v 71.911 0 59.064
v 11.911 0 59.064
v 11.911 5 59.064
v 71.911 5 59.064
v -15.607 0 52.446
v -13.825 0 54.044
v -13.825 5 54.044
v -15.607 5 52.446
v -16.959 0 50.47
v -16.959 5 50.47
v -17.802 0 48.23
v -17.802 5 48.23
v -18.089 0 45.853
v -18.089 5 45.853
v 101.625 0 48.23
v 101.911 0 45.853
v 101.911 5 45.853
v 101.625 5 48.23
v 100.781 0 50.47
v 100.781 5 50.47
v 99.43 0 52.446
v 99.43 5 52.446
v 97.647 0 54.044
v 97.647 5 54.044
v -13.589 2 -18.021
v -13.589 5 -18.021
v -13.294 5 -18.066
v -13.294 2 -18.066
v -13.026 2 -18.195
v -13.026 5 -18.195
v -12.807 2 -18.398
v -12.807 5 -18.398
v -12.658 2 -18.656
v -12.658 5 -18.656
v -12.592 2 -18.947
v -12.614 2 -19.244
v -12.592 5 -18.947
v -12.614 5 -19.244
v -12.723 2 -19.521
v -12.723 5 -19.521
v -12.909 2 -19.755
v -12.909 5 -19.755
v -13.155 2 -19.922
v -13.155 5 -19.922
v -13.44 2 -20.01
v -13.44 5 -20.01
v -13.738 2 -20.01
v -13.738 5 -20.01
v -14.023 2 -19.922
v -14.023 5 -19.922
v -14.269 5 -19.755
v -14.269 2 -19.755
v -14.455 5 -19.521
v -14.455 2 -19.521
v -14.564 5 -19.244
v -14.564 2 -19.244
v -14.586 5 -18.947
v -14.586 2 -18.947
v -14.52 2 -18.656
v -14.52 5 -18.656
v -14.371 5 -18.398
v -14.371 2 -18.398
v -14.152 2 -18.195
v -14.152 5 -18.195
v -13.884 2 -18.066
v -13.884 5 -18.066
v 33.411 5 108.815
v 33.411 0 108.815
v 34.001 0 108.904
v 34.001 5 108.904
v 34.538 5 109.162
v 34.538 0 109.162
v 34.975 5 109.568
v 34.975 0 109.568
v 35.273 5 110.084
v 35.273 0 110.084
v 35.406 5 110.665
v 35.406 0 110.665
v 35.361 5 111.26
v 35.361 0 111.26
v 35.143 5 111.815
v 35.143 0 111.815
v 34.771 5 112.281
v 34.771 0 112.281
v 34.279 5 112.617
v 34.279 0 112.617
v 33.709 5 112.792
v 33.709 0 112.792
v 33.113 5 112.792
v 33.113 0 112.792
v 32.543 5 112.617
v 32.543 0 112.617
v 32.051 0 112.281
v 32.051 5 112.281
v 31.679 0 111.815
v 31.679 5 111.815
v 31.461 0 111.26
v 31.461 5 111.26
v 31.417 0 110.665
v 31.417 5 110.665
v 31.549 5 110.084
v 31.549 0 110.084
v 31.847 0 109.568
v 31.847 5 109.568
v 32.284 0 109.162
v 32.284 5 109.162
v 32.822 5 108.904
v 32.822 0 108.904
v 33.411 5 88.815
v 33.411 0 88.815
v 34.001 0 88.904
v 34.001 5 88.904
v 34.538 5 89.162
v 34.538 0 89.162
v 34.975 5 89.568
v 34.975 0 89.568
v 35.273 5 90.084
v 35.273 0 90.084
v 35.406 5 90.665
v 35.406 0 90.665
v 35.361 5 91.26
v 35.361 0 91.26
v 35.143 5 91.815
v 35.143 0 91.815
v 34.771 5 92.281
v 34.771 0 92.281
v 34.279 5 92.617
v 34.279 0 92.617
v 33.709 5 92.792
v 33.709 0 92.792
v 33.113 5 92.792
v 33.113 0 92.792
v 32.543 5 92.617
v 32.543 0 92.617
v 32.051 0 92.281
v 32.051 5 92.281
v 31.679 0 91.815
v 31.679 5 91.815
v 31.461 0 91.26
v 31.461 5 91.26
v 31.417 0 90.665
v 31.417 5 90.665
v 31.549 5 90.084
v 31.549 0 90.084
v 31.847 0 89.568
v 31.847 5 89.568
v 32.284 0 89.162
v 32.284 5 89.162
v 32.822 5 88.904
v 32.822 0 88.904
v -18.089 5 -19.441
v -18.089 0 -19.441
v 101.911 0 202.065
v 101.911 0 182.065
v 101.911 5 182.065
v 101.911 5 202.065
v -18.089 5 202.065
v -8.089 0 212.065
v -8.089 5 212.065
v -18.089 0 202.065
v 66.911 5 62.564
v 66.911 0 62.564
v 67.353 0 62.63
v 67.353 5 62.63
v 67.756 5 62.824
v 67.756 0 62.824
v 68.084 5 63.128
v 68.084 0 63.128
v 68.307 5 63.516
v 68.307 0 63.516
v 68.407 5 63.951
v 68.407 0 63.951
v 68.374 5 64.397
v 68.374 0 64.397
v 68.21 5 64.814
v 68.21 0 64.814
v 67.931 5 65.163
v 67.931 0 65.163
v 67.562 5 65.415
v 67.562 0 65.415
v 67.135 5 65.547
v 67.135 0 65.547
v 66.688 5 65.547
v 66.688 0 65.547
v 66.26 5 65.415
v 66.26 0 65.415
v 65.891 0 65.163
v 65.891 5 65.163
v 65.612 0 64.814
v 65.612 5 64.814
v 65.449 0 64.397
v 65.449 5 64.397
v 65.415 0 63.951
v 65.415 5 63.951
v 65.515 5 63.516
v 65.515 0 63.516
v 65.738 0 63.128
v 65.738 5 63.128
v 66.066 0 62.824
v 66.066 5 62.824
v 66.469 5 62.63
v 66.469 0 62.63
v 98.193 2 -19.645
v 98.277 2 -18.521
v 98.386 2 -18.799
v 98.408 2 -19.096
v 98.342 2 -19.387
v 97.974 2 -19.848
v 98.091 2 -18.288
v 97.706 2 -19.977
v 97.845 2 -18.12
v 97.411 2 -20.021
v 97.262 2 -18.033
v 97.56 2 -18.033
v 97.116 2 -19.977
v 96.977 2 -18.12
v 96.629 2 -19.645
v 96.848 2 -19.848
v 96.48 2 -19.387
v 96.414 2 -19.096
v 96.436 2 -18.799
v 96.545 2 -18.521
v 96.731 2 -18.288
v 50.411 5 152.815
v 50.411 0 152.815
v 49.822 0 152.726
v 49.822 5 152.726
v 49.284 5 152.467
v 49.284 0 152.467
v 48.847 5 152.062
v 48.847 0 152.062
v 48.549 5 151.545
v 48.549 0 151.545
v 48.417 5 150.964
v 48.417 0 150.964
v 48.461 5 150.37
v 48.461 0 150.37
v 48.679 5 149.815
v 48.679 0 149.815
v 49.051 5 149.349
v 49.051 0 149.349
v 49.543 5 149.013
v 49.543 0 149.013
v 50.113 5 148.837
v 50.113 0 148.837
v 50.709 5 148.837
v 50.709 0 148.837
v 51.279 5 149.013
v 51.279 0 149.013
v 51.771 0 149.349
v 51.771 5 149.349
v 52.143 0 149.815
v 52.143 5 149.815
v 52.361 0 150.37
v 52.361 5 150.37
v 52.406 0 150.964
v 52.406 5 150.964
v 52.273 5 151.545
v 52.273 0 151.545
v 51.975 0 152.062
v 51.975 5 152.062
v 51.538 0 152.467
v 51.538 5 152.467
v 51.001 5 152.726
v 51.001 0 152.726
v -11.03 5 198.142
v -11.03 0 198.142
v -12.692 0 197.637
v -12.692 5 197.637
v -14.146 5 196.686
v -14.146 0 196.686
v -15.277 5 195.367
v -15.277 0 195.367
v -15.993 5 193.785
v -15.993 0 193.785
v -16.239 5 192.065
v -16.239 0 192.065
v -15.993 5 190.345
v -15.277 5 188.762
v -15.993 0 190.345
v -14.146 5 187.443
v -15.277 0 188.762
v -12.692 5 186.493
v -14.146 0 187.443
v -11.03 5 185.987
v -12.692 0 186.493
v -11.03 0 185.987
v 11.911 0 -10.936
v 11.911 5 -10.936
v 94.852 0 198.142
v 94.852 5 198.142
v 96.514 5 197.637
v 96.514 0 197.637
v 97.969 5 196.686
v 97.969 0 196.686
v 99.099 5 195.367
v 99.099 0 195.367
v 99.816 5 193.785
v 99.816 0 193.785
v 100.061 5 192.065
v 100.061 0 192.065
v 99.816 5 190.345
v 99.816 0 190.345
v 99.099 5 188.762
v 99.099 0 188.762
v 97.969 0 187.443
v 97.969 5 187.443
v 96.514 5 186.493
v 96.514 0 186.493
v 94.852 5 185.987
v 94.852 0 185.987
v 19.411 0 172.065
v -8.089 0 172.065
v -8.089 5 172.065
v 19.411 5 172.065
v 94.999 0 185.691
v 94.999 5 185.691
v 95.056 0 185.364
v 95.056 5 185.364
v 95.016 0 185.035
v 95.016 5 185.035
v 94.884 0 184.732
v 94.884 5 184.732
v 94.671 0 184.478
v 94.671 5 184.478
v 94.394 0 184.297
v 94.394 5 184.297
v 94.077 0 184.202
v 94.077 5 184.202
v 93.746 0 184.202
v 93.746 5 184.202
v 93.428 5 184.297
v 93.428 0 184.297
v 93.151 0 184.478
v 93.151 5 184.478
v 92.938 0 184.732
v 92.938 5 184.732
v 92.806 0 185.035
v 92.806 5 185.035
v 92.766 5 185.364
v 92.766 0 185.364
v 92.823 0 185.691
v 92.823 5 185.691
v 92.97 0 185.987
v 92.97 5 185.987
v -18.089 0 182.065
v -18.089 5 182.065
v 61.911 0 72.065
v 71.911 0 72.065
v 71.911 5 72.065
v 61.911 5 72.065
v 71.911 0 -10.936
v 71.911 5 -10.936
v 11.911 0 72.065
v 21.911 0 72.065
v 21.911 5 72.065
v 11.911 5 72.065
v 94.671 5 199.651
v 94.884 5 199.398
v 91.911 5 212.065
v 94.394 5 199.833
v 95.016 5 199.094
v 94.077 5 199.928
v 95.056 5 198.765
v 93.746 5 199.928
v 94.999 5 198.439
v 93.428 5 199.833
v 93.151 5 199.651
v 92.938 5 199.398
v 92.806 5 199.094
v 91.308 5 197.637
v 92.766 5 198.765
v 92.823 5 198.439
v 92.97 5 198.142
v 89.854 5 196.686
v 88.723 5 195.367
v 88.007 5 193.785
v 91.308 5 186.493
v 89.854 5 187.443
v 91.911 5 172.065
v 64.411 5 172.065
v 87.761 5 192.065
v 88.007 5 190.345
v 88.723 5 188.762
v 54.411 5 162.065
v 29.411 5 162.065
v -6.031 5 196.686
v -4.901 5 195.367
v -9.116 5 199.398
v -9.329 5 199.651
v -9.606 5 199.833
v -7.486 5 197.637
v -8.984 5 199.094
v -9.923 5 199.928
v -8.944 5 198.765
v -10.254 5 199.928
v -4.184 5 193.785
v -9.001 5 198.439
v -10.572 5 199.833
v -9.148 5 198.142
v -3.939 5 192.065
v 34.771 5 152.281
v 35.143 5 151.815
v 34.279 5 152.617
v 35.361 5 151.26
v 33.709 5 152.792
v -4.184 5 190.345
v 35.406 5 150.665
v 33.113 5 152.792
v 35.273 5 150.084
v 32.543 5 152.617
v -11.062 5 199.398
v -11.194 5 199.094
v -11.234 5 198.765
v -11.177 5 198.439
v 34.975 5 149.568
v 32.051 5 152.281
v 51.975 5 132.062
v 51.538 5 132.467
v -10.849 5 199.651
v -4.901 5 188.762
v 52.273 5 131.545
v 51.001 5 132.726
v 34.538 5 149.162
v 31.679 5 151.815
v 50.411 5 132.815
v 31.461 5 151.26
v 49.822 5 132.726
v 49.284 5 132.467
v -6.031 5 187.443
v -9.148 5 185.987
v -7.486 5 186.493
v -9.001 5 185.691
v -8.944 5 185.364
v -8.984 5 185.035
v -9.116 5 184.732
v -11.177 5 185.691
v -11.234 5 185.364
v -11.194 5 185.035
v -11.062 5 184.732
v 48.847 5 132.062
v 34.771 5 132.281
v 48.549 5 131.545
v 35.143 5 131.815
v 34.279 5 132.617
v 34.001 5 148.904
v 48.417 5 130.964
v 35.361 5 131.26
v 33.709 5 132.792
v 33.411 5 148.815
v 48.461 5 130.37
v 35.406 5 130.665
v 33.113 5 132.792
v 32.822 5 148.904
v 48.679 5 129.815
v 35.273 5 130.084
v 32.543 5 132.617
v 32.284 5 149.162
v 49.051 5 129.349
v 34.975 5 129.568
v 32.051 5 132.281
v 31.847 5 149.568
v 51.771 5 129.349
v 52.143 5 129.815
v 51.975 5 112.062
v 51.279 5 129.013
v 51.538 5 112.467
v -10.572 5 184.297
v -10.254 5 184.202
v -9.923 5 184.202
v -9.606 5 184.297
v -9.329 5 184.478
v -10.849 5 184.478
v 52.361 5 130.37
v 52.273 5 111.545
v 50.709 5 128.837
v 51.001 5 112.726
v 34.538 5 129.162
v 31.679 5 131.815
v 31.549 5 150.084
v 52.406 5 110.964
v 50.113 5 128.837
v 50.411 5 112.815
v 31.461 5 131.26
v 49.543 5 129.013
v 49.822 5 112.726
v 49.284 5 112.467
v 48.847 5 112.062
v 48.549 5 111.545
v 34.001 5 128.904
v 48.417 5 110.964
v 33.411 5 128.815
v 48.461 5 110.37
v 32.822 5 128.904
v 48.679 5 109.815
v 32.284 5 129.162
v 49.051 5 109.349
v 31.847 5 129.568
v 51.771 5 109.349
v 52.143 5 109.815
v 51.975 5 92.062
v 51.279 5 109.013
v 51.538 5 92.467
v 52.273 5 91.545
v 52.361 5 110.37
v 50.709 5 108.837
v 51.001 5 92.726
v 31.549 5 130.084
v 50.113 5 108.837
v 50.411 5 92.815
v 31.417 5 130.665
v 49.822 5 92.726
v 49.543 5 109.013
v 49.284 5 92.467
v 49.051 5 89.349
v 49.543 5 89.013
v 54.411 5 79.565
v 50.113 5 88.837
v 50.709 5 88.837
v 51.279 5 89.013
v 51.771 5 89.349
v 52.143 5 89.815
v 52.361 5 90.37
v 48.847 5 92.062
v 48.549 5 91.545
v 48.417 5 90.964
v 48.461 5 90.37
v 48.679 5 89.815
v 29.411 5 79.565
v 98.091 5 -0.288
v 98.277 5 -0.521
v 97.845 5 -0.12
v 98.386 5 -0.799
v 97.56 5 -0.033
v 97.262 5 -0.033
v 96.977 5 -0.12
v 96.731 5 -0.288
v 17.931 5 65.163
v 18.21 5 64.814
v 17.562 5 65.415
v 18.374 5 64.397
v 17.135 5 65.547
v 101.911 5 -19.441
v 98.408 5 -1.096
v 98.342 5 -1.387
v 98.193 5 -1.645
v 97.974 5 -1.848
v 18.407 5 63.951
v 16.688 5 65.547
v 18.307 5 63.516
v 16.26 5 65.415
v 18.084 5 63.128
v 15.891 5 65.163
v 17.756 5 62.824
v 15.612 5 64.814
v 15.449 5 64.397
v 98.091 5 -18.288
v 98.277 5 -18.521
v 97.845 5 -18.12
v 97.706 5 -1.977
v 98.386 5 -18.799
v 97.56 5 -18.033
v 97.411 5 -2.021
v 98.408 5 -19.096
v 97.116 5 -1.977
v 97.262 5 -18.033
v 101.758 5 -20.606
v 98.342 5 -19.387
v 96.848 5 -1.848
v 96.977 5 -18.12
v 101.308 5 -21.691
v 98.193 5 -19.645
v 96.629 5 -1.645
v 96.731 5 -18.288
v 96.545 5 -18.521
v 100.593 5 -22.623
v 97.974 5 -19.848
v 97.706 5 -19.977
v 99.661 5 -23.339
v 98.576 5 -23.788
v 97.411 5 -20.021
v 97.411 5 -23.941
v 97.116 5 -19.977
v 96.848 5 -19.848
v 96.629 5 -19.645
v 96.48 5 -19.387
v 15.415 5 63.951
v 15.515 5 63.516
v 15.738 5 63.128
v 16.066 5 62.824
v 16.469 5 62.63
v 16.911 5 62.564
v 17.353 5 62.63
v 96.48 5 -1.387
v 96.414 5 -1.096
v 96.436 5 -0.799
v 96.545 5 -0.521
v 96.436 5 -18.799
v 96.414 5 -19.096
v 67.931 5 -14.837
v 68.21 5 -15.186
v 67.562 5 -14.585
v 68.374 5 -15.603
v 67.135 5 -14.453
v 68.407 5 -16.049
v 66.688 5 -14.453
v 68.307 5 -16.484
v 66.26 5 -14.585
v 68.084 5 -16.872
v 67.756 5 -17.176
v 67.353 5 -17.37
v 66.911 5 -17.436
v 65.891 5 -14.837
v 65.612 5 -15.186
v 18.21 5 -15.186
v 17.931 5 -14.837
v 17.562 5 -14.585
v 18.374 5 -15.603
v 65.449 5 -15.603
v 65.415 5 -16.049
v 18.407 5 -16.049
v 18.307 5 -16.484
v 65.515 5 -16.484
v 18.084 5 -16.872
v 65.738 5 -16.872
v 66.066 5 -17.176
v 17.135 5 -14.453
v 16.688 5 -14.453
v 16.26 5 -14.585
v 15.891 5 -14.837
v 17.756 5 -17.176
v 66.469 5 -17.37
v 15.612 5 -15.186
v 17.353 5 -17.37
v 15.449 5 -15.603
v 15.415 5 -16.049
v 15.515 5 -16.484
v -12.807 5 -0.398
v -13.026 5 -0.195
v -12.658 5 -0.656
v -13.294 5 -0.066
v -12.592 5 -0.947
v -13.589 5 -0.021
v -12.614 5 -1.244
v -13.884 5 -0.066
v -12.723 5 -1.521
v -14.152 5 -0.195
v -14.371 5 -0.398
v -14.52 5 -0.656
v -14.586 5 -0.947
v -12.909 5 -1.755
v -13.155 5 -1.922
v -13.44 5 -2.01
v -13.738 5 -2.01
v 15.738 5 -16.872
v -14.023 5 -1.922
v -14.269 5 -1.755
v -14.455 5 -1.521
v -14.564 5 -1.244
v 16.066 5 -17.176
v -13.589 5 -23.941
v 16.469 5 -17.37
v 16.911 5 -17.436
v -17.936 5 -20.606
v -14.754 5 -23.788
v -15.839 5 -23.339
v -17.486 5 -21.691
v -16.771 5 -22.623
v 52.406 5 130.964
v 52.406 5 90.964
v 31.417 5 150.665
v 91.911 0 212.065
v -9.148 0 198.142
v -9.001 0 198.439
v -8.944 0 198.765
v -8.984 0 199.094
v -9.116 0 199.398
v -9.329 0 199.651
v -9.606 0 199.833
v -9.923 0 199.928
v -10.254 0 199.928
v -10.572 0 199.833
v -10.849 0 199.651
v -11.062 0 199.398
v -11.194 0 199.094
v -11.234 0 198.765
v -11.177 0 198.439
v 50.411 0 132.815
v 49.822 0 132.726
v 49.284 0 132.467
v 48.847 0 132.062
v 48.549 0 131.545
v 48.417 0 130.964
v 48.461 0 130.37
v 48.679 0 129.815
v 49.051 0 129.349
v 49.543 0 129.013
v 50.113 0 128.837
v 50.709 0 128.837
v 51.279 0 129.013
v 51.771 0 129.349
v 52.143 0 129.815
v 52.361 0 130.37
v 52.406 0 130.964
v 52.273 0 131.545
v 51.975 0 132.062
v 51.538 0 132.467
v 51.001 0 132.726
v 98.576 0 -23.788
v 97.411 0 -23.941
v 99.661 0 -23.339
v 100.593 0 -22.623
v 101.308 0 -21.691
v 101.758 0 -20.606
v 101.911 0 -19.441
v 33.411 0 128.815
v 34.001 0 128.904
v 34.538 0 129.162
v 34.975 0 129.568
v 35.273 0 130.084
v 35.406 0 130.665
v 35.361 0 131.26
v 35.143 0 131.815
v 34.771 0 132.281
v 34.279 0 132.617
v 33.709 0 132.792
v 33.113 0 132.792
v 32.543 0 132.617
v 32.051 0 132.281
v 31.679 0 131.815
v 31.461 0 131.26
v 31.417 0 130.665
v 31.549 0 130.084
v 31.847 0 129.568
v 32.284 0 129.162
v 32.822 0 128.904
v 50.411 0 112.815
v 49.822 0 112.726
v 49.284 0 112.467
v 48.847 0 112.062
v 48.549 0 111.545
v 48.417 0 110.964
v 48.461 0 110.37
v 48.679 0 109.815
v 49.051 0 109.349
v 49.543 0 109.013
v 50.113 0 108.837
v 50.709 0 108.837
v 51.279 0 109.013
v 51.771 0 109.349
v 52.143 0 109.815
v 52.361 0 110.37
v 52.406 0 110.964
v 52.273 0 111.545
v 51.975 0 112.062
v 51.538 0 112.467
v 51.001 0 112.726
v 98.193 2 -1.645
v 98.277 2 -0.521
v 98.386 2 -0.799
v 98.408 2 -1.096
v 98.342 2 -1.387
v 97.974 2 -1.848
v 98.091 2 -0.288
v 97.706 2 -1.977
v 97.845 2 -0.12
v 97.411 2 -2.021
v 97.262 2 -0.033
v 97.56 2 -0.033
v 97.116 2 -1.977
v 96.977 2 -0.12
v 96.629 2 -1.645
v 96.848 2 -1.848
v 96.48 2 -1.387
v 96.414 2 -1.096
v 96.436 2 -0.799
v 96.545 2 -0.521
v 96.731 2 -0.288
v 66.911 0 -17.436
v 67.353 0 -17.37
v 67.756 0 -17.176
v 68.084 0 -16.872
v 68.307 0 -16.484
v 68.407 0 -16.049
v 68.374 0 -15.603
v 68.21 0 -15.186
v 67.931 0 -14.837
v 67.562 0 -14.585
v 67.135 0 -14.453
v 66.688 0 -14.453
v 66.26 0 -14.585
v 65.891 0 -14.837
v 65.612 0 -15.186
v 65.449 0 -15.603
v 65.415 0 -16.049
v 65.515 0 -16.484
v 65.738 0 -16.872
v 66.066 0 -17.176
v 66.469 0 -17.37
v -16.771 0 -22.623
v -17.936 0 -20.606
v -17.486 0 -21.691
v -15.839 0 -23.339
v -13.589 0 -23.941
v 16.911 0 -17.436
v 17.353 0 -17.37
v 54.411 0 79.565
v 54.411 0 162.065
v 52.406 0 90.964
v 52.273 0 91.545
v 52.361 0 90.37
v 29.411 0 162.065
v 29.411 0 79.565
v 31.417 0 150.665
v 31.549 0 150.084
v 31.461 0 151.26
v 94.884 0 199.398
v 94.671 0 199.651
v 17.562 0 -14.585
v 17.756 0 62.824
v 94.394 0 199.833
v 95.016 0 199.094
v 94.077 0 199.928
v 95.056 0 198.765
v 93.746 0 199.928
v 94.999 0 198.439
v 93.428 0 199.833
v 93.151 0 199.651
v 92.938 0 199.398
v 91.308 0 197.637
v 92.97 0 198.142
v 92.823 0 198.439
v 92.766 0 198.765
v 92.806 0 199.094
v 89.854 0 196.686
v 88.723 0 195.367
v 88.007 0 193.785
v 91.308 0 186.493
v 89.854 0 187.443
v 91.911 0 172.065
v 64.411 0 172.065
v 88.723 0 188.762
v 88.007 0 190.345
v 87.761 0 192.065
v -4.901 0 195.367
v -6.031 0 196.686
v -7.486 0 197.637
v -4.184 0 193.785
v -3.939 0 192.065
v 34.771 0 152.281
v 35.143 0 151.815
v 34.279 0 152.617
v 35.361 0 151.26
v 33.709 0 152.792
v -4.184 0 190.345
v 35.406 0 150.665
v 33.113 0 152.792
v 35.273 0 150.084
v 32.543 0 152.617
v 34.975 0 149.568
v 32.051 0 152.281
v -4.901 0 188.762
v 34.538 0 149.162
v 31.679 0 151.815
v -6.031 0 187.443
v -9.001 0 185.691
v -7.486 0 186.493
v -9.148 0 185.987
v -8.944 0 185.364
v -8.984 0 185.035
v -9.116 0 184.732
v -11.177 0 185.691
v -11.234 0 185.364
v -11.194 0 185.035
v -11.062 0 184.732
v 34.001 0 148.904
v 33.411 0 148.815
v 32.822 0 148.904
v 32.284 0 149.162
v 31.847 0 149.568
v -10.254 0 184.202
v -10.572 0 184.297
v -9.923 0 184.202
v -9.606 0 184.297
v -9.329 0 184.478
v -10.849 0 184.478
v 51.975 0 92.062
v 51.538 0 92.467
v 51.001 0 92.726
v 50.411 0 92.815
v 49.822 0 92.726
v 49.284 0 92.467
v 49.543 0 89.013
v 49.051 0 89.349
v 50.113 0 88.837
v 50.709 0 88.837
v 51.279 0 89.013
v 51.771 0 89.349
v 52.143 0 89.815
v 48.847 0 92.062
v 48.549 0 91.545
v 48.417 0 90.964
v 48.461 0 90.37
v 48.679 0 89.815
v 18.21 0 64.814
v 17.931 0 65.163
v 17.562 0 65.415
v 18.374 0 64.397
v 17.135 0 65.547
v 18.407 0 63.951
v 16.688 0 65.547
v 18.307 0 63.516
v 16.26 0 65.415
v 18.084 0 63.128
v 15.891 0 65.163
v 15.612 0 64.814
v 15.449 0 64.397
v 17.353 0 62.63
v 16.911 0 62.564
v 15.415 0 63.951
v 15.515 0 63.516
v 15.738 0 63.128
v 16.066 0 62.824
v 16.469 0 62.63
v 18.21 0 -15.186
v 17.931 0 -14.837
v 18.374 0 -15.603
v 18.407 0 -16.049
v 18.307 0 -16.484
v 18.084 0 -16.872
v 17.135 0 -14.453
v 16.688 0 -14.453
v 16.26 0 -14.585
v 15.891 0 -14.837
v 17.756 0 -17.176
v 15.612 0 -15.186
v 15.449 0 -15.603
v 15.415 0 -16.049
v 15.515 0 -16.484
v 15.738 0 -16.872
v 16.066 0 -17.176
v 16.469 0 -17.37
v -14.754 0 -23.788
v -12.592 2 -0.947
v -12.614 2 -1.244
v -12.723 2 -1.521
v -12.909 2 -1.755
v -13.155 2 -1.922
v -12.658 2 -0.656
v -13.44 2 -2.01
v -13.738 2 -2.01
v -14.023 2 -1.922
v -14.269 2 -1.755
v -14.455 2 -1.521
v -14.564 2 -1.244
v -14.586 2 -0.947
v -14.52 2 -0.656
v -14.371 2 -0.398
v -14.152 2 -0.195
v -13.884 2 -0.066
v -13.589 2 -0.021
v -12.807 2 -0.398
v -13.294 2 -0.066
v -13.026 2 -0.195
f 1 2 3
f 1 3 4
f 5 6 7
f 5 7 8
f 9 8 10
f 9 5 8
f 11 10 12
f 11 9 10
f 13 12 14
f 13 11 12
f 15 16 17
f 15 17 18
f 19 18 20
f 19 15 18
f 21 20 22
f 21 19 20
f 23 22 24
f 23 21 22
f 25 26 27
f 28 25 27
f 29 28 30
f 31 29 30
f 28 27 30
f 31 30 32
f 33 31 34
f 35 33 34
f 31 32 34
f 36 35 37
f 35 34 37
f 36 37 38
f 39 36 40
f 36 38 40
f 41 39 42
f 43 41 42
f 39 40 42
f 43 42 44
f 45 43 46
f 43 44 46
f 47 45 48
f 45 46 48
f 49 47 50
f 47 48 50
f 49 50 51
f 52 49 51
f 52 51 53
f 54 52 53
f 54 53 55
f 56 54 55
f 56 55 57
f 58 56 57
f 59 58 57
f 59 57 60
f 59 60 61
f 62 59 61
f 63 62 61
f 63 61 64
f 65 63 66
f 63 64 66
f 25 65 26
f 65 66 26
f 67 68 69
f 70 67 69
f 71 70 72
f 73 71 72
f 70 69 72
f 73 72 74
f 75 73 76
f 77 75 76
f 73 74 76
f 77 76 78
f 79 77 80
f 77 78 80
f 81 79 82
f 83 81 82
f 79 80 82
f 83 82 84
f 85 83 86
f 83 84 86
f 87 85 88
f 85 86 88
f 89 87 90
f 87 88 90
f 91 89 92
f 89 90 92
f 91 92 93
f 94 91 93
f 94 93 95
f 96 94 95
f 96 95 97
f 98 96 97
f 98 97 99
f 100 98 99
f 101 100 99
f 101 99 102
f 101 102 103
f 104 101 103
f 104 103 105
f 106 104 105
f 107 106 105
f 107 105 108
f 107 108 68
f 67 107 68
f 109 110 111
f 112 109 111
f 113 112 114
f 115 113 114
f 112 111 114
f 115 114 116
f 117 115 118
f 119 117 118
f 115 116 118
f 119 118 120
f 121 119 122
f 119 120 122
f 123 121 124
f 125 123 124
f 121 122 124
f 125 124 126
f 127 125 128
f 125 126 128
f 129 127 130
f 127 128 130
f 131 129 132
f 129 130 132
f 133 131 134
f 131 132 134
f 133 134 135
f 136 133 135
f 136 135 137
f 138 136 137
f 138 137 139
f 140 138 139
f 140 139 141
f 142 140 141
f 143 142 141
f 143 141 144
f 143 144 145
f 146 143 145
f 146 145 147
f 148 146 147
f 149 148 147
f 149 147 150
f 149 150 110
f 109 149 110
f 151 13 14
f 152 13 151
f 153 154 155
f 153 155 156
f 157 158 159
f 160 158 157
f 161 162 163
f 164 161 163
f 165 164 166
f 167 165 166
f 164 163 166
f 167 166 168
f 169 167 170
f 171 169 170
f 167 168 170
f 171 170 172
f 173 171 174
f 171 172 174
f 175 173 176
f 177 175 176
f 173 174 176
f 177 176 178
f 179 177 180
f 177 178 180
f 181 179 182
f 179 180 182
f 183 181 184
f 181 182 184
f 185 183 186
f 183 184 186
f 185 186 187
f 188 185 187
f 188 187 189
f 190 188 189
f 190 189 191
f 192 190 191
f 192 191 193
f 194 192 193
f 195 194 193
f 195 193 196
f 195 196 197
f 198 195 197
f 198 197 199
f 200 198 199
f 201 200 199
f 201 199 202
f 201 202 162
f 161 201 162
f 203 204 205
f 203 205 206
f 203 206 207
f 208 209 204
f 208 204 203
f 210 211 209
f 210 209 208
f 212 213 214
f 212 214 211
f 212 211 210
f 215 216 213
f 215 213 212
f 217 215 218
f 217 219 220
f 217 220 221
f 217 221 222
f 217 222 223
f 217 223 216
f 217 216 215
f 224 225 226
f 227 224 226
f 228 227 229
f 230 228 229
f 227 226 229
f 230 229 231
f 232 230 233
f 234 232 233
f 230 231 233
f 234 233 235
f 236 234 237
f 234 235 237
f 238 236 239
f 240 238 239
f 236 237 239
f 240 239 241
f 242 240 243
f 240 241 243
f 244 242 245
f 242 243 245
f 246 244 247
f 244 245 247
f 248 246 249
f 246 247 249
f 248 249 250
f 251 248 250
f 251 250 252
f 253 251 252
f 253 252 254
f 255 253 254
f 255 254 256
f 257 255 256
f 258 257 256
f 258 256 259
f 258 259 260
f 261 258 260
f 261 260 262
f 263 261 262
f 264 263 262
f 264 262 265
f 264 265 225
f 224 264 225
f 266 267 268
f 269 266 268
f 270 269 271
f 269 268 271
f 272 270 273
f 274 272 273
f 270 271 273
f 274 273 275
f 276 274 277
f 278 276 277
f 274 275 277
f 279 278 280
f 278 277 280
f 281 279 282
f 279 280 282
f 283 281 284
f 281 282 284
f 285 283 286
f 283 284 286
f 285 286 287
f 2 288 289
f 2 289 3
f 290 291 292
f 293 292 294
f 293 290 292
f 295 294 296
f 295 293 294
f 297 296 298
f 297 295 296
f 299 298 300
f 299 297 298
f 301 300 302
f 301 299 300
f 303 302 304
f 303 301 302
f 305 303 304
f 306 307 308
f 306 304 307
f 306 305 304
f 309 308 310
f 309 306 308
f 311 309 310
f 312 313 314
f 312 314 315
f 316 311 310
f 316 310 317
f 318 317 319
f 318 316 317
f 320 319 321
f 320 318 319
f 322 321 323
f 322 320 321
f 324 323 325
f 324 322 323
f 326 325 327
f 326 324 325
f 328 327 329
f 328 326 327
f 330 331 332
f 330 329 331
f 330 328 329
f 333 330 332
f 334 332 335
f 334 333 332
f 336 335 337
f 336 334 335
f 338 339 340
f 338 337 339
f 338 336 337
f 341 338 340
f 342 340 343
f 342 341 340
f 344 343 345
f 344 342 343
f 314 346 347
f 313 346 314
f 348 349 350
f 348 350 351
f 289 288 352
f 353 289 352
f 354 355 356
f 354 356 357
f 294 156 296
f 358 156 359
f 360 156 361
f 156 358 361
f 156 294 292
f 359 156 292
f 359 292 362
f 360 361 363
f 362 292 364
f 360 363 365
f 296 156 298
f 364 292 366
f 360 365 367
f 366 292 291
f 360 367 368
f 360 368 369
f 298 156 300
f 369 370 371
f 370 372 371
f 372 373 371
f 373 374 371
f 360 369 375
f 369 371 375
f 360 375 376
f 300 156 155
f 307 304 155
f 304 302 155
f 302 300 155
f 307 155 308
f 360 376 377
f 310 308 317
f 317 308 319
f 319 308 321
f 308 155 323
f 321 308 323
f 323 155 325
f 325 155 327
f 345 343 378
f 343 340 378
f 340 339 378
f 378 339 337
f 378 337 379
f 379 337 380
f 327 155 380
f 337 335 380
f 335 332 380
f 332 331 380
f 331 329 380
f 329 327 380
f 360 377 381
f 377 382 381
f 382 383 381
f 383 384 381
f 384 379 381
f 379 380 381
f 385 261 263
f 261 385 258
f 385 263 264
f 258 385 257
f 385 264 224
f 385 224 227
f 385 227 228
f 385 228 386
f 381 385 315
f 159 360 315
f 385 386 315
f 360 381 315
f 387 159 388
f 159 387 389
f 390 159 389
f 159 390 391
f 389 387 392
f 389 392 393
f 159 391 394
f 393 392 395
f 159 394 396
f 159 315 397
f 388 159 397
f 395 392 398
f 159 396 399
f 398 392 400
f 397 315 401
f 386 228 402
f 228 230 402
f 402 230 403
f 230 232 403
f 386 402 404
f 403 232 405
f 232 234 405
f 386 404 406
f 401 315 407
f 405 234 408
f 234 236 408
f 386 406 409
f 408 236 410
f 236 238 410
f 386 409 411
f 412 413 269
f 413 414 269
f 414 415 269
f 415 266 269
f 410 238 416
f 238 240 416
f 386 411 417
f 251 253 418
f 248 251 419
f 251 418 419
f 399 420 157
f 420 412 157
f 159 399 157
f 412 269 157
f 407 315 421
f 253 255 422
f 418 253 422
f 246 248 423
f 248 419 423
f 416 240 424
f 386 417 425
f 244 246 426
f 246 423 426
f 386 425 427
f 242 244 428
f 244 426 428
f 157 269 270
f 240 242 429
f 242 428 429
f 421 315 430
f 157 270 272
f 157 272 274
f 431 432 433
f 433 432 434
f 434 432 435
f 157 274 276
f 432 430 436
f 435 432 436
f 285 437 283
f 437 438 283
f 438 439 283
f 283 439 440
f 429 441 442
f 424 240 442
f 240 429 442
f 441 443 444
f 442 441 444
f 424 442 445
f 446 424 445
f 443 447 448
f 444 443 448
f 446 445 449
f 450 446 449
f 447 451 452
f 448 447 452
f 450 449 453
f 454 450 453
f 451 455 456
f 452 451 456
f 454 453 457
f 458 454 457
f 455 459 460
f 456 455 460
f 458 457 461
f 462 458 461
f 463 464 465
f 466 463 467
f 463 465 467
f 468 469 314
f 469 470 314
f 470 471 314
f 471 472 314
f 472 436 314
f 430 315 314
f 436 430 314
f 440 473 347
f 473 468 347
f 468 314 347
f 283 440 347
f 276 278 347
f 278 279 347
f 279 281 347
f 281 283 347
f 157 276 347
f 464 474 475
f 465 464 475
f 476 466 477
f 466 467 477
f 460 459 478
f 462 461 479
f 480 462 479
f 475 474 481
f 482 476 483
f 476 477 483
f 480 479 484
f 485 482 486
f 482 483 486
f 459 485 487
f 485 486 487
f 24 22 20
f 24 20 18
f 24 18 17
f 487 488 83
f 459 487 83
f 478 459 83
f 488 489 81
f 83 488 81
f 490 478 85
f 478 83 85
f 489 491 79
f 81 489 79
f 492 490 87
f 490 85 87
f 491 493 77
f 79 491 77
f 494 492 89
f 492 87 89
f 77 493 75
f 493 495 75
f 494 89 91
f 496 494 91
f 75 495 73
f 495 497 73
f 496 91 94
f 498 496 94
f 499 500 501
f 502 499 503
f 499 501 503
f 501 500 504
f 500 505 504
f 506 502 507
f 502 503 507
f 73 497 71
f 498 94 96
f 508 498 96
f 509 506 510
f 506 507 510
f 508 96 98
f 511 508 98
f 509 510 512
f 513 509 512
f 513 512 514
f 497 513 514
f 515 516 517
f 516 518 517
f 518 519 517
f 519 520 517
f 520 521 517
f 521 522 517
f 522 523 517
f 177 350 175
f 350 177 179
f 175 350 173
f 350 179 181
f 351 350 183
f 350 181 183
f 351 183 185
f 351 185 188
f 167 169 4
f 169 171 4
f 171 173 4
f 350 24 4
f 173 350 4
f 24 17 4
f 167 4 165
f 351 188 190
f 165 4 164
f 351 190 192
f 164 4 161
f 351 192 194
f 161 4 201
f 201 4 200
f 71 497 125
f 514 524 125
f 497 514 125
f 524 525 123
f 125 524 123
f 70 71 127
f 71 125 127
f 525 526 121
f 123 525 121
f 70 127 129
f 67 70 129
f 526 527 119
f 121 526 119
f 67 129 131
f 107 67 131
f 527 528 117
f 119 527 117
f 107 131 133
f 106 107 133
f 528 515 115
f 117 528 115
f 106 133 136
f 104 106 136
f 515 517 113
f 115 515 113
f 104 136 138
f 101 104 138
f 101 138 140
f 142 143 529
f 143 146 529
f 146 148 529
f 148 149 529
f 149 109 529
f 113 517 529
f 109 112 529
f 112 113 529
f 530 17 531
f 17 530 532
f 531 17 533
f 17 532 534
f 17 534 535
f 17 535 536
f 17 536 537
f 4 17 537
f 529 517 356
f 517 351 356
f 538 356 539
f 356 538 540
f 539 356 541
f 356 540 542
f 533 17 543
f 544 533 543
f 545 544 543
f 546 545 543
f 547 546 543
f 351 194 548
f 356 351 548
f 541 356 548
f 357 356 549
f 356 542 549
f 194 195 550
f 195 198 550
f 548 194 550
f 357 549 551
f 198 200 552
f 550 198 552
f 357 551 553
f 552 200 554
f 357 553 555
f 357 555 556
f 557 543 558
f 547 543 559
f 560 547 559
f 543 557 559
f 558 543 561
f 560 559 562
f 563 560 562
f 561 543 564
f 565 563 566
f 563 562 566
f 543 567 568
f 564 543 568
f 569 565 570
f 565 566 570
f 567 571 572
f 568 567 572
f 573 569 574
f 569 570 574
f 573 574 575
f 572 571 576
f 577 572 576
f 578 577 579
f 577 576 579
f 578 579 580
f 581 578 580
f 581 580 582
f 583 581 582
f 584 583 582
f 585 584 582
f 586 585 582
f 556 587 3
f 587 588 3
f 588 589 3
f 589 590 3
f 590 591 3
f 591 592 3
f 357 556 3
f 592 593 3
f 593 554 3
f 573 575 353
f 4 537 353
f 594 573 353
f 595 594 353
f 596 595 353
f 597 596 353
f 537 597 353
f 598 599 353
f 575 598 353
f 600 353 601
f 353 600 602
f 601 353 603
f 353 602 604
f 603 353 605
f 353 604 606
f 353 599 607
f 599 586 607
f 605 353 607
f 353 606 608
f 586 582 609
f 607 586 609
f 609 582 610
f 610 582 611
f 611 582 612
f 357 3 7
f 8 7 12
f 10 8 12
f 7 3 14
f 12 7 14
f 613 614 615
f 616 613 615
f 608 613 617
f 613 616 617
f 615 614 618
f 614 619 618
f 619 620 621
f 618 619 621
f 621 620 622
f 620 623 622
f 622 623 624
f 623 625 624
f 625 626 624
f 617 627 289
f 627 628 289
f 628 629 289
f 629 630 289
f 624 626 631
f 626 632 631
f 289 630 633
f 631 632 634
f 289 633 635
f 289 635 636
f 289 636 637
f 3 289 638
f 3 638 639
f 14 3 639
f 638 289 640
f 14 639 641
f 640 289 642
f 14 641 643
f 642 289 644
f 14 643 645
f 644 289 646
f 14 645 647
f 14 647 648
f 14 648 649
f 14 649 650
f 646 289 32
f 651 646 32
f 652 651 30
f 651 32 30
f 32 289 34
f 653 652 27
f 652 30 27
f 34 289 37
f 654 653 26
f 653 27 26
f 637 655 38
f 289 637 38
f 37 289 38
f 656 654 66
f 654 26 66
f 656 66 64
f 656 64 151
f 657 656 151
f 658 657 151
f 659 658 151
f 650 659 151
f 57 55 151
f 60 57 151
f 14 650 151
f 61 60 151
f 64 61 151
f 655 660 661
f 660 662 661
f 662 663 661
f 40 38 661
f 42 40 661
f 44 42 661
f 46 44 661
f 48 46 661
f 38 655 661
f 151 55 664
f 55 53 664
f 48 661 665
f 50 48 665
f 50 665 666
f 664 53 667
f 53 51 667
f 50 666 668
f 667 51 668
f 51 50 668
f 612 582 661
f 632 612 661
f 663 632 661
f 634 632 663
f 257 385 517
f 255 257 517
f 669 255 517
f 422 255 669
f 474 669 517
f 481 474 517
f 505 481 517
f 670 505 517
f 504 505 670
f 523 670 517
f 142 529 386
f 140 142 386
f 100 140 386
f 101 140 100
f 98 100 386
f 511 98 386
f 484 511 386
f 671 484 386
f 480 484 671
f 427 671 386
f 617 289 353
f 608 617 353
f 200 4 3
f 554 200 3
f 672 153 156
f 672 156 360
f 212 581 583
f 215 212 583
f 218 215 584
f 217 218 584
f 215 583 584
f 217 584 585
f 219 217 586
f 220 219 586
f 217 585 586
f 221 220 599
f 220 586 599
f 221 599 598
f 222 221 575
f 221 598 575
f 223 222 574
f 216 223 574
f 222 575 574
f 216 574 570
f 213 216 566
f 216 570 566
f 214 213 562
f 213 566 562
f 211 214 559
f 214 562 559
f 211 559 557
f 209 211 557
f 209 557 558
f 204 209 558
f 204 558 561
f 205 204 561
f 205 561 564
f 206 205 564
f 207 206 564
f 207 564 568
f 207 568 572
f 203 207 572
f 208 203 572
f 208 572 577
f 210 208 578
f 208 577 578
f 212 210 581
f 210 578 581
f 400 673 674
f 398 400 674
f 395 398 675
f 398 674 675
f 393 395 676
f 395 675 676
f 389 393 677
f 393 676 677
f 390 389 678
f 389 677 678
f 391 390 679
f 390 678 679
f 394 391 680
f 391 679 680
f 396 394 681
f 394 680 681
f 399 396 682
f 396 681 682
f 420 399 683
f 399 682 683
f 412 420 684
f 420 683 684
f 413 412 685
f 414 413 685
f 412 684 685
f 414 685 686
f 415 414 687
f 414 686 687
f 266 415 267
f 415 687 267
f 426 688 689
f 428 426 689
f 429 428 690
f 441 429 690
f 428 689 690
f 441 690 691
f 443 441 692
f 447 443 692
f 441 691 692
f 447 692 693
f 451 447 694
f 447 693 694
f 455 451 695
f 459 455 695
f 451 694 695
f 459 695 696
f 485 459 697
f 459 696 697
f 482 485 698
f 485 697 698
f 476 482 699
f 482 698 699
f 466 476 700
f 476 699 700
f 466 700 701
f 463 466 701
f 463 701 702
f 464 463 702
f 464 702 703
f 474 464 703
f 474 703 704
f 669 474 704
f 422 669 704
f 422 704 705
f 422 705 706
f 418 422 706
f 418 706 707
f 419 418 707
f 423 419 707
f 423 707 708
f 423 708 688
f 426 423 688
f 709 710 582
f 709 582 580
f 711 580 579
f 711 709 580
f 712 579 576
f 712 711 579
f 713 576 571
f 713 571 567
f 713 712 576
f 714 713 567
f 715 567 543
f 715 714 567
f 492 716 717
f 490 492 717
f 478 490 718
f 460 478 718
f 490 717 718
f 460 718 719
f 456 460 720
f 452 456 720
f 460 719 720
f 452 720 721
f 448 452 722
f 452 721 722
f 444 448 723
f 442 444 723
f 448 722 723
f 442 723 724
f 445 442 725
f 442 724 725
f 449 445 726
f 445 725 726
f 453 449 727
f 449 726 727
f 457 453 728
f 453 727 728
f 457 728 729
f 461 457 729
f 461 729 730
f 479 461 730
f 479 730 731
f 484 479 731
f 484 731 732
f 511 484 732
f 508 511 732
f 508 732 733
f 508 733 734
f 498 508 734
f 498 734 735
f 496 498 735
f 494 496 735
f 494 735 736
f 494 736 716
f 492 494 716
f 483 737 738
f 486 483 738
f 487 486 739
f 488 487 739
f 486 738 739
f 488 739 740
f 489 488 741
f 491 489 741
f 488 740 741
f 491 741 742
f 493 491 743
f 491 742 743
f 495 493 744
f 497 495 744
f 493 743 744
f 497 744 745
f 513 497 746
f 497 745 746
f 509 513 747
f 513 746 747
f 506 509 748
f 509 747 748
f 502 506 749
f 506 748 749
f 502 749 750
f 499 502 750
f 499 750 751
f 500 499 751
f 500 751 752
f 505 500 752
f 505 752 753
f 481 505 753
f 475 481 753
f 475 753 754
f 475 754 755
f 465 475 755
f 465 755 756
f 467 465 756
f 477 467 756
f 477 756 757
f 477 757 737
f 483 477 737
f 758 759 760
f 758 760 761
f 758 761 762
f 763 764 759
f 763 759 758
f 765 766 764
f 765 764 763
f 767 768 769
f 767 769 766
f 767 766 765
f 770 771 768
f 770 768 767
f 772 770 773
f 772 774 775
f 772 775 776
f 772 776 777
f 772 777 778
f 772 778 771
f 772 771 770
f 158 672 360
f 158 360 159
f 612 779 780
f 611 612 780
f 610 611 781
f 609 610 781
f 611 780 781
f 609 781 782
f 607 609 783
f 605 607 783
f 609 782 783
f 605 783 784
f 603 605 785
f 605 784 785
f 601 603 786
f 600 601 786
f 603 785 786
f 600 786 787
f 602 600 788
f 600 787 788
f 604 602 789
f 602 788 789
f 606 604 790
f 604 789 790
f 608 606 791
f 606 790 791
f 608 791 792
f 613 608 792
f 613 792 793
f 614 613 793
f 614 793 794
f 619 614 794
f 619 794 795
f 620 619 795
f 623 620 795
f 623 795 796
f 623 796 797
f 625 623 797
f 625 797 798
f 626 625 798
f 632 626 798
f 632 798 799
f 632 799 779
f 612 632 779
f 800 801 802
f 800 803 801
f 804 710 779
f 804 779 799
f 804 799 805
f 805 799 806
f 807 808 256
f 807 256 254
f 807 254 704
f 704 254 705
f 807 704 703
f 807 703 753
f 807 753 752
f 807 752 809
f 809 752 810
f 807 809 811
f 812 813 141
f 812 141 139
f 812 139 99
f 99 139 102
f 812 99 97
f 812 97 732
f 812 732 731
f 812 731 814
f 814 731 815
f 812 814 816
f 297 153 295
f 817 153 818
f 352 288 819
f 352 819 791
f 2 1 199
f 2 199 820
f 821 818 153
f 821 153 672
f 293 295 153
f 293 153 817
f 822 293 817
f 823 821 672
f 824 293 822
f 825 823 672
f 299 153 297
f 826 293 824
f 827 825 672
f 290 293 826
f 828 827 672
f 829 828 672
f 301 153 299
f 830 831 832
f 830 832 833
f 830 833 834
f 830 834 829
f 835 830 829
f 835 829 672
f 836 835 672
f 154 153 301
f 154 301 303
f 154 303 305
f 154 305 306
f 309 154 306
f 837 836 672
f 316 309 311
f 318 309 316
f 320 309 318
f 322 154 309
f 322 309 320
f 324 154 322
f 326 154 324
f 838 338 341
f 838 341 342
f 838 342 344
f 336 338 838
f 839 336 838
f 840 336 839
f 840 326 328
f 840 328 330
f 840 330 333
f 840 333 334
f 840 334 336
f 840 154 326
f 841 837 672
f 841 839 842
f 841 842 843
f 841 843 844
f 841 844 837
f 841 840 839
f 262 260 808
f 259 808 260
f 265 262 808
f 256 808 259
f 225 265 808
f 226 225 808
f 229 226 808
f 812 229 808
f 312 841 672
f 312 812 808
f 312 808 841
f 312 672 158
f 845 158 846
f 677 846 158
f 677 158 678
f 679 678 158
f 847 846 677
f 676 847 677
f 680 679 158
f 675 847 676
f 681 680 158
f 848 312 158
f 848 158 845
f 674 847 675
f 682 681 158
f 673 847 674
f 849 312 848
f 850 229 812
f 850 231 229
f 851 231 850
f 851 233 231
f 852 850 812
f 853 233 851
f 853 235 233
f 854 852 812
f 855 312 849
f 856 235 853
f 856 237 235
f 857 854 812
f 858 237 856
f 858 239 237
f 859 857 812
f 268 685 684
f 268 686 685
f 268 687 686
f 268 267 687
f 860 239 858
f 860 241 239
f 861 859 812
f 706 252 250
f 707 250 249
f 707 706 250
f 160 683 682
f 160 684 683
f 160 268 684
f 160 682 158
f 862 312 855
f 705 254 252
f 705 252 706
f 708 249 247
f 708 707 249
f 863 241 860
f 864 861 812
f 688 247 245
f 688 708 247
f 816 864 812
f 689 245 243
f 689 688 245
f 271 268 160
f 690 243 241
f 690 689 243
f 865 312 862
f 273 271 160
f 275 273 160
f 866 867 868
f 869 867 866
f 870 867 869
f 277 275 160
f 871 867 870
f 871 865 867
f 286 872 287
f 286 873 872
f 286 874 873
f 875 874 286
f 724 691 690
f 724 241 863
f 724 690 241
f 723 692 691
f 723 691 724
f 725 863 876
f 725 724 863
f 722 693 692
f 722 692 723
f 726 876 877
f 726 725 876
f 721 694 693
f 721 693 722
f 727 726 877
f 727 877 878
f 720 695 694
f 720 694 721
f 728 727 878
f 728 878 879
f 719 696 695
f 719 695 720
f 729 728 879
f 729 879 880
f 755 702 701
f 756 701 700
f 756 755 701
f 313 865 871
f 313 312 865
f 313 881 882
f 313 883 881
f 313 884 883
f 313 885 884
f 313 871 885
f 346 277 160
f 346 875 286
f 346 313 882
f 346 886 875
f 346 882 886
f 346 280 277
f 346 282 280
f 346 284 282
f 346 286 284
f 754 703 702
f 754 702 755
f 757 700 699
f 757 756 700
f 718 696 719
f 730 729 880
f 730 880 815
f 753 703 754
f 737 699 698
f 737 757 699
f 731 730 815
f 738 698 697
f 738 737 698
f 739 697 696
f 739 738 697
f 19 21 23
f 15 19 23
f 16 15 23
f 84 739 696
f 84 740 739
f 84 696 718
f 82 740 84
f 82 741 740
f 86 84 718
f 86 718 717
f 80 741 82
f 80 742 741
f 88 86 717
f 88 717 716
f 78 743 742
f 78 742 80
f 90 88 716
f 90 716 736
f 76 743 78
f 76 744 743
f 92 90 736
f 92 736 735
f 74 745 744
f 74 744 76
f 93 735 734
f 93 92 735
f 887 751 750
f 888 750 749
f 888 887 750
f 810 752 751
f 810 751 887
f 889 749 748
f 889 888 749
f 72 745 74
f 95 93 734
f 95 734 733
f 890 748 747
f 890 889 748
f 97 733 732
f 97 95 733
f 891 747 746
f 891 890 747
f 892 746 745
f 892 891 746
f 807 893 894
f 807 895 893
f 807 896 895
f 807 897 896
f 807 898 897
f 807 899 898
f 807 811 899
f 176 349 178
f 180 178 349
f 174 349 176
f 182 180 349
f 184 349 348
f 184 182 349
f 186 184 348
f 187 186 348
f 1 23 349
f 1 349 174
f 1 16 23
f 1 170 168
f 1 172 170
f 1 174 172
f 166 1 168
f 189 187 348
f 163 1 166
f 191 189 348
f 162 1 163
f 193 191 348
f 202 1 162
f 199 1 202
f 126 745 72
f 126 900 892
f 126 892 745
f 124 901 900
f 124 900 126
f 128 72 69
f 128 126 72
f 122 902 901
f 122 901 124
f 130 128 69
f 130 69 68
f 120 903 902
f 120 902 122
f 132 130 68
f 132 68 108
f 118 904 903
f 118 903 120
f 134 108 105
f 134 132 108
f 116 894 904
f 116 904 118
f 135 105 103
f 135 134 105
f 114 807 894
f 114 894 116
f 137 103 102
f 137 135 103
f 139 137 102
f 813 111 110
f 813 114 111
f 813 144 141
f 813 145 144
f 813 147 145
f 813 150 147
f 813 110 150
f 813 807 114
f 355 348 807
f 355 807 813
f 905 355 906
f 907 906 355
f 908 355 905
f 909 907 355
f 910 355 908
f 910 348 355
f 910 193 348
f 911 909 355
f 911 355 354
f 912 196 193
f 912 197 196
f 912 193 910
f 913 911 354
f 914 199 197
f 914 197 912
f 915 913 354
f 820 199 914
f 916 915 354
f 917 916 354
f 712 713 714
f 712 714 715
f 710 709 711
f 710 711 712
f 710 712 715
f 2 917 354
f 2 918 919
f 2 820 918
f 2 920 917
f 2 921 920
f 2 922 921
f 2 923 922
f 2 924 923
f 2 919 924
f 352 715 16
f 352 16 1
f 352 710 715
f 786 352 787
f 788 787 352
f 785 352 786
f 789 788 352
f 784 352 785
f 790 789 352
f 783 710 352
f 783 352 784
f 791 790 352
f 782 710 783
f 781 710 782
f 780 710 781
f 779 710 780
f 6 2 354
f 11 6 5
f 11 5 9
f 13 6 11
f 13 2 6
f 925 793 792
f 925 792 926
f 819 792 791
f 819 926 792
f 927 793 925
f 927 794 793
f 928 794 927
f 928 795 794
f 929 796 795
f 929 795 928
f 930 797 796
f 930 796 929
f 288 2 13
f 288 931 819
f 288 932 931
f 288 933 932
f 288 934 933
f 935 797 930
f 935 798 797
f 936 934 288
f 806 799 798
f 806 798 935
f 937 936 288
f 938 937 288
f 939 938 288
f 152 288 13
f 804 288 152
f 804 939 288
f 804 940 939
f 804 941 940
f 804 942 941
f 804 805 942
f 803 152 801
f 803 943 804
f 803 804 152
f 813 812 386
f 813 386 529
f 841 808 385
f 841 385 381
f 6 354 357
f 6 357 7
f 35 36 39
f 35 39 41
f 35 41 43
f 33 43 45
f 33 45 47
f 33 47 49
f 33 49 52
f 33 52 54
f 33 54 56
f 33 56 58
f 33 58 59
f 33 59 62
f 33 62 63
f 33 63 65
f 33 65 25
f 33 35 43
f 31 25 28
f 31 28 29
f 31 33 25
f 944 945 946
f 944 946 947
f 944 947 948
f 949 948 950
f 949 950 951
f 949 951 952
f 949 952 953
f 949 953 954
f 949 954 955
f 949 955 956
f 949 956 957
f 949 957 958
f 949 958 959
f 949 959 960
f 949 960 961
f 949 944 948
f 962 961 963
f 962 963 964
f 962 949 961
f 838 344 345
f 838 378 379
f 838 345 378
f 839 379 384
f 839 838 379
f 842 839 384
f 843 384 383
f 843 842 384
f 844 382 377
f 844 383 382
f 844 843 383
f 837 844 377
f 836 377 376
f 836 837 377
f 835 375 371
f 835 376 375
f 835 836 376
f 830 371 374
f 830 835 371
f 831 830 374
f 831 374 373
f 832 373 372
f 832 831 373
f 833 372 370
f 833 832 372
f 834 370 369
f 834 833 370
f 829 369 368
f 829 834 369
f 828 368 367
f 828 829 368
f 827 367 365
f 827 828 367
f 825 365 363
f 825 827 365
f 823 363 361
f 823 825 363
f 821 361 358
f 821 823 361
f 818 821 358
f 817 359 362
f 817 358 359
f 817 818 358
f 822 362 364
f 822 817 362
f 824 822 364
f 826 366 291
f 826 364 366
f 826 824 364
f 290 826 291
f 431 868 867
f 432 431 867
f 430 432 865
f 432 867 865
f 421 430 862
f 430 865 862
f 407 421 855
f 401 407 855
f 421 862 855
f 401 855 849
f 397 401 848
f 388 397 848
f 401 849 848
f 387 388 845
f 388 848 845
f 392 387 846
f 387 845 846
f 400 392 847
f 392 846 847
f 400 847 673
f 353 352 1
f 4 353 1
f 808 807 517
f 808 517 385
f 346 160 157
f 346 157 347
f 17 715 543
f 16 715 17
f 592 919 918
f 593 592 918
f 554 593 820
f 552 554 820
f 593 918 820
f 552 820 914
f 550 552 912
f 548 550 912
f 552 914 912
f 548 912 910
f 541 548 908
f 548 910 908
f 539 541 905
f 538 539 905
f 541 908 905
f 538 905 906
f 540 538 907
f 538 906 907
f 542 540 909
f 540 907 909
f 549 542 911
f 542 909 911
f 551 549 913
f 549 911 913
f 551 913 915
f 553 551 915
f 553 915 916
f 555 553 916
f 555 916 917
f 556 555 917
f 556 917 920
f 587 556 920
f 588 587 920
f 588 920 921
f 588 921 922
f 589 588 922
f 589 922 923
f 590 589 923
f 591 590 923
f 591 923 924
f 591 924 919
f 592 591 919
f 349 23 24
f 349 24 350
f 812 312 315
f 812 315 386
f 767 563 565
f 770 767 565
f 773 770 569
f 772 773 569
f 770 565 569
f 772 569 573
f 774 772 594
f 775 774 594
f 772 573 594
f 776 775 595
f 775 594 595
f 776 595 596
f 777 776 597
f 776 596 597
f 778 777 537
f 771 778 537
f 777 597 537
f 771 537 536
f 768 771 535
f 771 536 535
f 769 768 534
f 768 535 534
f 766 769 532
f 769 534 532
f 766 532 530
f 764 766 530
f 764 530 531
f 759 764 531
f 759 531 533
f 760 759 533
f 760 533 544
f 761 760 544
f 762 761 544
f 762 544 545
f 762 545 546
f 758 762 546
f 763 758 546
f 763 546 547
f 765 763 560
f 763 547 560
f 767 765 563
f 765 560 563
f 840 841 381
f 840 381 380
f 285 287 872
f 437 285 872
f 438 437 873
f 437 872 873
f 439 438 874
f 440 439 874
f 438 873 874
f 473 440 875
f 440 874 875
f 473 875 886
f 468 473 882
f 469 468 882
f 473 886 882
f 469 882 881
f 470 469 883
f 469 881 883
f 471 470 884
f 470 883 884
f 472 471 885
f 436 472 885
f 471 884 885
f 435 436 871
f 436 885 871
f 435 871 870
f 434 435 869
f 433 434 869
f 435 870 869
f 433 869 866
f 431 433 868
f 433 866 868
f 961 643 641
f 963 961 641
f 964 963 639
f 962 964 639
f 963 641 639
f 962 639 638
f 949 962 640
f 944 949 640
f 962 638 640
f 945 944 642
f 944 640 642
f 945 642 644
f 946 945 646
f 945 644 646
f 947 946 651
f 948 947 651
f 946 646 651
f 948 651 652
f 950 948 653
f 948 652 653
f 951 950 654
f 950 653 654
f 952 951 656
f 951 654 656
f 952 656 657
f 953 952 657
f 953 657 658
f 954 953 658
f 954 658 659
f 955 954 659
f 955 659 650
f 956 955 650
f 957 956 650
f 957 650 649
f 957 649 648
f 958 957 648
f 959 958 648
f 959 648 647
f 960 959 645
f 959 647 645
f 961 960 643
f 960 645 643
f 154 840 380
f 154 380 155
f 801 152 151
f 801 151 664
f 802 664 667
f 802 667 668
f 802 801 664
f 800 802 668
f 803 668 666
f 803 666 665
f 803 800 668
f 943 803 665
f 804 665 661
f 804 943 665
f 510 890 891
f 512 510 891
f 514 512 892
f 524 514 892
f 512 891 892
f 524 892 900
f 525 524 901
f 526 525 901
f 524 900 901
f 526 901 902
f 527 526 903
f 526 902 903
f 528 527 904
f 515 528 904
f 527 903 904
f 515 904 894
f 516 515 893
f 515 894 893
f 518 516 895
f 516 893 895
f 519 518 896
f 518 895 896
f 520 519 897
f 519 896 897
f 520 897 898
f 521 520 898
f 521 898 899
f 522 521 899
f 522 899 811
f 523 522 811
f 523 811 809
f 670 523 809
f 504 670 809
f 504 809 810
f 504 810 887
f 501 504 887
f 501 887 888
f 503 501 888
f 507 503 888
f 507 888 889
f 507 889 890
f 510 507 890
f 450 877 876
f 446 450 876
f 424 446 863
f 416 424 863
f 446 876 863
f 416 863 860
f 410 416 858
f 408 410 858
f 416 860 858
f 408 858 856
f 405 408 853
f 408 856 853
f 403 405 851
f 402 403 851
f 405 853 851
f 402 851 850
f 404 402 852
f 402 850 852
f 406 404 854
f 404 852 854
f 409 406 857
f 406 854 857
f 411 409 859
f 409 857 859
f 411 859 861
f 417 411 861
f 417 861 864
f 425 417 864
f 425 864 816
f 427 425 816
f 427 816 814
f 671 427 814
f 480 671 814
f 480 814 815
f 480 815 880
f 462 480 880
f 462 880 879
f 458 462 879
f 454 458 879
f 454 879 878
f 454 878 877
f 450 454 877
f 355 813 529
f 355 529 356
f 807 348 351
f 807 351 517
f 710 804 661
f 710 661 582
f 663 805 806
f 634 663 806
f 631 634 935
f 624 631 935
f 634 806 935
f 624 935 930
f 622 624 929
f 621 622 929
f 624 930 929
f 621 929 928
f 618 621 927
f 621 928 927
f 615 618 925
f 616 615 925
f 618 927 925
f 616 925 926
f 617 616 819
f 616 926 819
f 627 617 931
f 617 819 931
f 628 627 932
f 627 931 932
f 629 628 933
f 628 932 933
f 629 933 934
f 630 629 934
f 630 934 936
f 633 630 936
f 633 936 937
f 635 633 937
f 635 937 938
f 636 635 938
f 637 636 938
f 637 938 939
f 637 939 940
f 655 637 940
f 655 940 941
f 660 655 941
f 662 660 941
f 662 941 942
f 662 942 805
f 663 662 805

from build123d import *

# Parameters (mm, degrees)
BASE_DEPTH               = 5
ESBO_O2_R                = 1
FURO_BRACKET_MOTOR_DEPTH = 3
ESBO_O4_W                = 60
ESBO_O4_H                = 70
ENCAIXE_PCB_DEPTH        = 236.334523507
ESBO_O6_R                = 1.5
PARAFUSO_PCB_DEPTH       = 236.334523507
ESBO_O7_R                = 2
ENFORCA_GATO_DEPTH       = 236.334523507
CORTE_EXTRUS_O1_DEPTH    = 10


with BuildPart() as part:
    # Esboço1 → Base (new body)
    with BuildSketch(Plane(origin=(0, 0, 0), x_dir=(1, 0, 0), z_dir=(0, 1, 0))):
        with BuildLine():
            Line((-18.088885989, 17.941465294), (-18.088885989, 19.441465294))
            ThreePointArc((-18.088885989, 19.441465294), (-16.770866504, 22.623445809), (-13.588885989, 23.941465294))
            Line((-13.588885989, 23.941465294), (97.411114011, 23.941465294))
            ThreePointArc((97.411114011, 23.941465294), (100.593094526, 22.623445809), (101.911114011, 19.441465294))
            Line((101.911114011, 19.441465294), (101.911114011, 17.941465294))
            Line((101.911114011, 17.941465294), (101.911114011, -45.8528642))
            ThreePointArc((101.911114011, -45.8528642), (100.781222343, -50.470350333), (97.646878374, -54.044384643))
            Line((97.646878374, -54.044384643), (71.911114011, -72.064760852))
            Line((71.911114011, -72.064760852), (61.911114011, -72.064760852))
            Line((61.911114011, -72.064760852), (54.411114011, -79.564760852))
            Line((54.411114011, -79.564760852), (54.411114011, -162.064760852))
            Line((54.411114011, -162.064760852), (64.411114011, -172.064760852))
            Line((64.411114011, -172.064760852), (91.911114011, -172.064760852))
            Line((91.911114011, -172.064760852), (101.911114011, -182.064760852))
            Line((101.911114011, -182.064760852), (101.911114011, -202.064760852))
            Line((101.911114011, -202.064760852), (91.911114011, -212.064760852))
            Line((91.911114011, -212.064760852), (-8.088885989, -212.064760852))
            Line((-8.088885989, -212.064760852), (-18.088885989, -202.064760852))
            Line((-18.088885989, -202.064760852), (-18.088885989, -182.064760852))
            Line((-18.088885989, -182.064760852), (-8.088885989, -172.064760852))
            Line((-8.088885989, -172.064760852), (19.411114011, -172.064760852))
            Line((19.411114011, -172.064760852), (29.411114011, -162.064760852))
            Line((29.411114011, -162.064760852), (29.411114011, -79.564760852))
            Line((29.411114011, -79.564760852), (21.911114011, -72.064760852))
            Line((21.911114011, -72.064760852), (11.911114011, -72.064760852))
            Line((11.911114011, -72.064760852), (-13.824650353, -54.044384643))
            ThreePointArc((-13.824650353, -54.044384643), (-16.958994321, -50.470350333), (-18.088885989, -45.8528642))
            Line((-18.088885989, -45.8528642), (-18.088885989, 17.941465294))
        make_face()
    extrude(amount=BASE_DEPTH)

    # Esboço2 → Furo Bracket Motor (cut)
    with BuildSketch(Plane(origin=(0, 5, 0), x_dir=(1, 0, 0), z_dir=(0, 1, 0))):
        with Locations(Location((-13.588885989, 19.021465294, 0), (0, 0, 270))):
            Circle(ESBO_O2_R)
        with Locations(Location((-13.588885989, 1.021465294, 0), (0, 0, 270))):
            Circle(ESBO_O2_R)
        with Locations(Location((97.411114011, 1.021465294, 0), (0, 0, 90))):
            Circle(ESBO_O2_R)
        with Locations(Location((97.411114011, 19.021465294, 0), (0, 0, 90))):
            Circle(ESBO_O2_R)
    extrude(amount=-FURO_BRACKET_MOTOR_DEPTH, mode=Mode.SUBTRACT)

    # Esboço4 → Encaixe PCB (cut, through all)
    with BuildSketch(Plane.XZ):
        with Locations((41.911114011, 24.063534706)):
            Rectangle(ESBO_O4_W, ESBO_O4_H)
    extrude(amount=-ENCAIXE_PCB_DEPTH, mode=Mode.SUBTRACT)

    # Esboço6 → Parafuso PCB (cut, through all)
    with BuildSketch(Plane.XZ):
        with Locations(Location((16.911114011, 64.063534706, 0), (0, 0, 270))):
            Circle(ESBO_O6_R)
        with Locations(Location((66.911114011, 64.063534706, 0), (0, 0, 270))):
            Circle(ESBO_O6_R)
        with Locations(Location((66.911114011, -15.936465294, 0), (0, 0, 270))):
            Circle(ESBO_O6_R)
        with Locations(Location((16.911114011, -15.936465294, 0), (0, 0, 270))):
            Circle(ESBO_O6_R)
    extrude(amount=-PARAFUSO_PCB_DEPTH, mode=Mode.SUBTRACT)

    # Esboço7 → Enforca Gato (cut, through all)
    with BuildSketch(Plane.XZ):
        with Locations(Location((33.411114011, 90.814760852, 0), (0, 0, 270))):
            Circle(ESBO_O7_R)
        with Locations(Location((33.411114011, 110.814760852, 0), (0, 0, 270))):
            Circle(ESBO_O7_R)
        with Locations(Location((33.411114011, 130.814760852, 0), (0, 0, 270))):
            Circle(ESBO_O7_R)
        with Locations(Location((33.411114011, 150.814760852, 0), (0, 0, 270))):
            Circle(ESBO_O7_R)
        with Locations(Location((50.411114011, 150.814760852, 0), (0, 0, 90))):
            Circle(ESBO_O7_R)
        with Locations(Location((50.411114011, 130.814760852, 0), (0, 0, 90))):
            Circle(ESBO_O7_R)
        with Locations(Location((50.411114011, 110.814760852, 0), (0, 0, 90))):
            Circle(ESBO_O7_R)
        with Locations(Location((50.411114011, 90.814760852, 0), (0, 0, 90))):
            Circle(ESBO_O7_R)
    extrude(amount=-ENFORCA_GATO_DEPTH, mode=Mode.SUBTRACT)

    # Esboço8 → Corte-extrusão1 (cut)
    with BuildSketch(Plane.XZ):
        with BuildLine():
            ThreePointArc((-11.029836312, 185.987169842), (-10.088885989, 184.189760852), (-9.147935666, 185.987169842))
            ThreePointArc((-9.147935666, 185.987169842), (-3.938885989, 192.064760852), (-9.147935666, 198.142351863))
            ThreePointArc((-9.147935666, 198.142351863), (-10.088885989, 199.939760852), (-11.029836312, 198.142351863))
            ThreePointArc((-11.029836312, 198.142351863), (-16.238885989, 192.064760852), (-11.029836312, 185.987169842))
        make_face()
        with BuildLine():
            ThreePointArc((92.970163688, 185.987169842), (87.761114011, 192.064760852), (92.970163688, 198.142351863))
            ThreePointArc((92.970163688, 198.142351863), (93.911114011, 199.939760852), (94.852064334, 198.142351863))
            ThreePointArc((94.852064334, 198.142351863), (100.061114011, 192.064760852), (94.852064334, 185.987169842))
            ThreePointArc((94.852064334, 185.987169842), (93.911114011, 184.189760852), (92.970163688, 185.987169842))
        make_face()
    extrude(amount=-CORTE_EXTRUS_O1_DEPTH, mode=Mode.SUBTRACT)


solid = part.part
